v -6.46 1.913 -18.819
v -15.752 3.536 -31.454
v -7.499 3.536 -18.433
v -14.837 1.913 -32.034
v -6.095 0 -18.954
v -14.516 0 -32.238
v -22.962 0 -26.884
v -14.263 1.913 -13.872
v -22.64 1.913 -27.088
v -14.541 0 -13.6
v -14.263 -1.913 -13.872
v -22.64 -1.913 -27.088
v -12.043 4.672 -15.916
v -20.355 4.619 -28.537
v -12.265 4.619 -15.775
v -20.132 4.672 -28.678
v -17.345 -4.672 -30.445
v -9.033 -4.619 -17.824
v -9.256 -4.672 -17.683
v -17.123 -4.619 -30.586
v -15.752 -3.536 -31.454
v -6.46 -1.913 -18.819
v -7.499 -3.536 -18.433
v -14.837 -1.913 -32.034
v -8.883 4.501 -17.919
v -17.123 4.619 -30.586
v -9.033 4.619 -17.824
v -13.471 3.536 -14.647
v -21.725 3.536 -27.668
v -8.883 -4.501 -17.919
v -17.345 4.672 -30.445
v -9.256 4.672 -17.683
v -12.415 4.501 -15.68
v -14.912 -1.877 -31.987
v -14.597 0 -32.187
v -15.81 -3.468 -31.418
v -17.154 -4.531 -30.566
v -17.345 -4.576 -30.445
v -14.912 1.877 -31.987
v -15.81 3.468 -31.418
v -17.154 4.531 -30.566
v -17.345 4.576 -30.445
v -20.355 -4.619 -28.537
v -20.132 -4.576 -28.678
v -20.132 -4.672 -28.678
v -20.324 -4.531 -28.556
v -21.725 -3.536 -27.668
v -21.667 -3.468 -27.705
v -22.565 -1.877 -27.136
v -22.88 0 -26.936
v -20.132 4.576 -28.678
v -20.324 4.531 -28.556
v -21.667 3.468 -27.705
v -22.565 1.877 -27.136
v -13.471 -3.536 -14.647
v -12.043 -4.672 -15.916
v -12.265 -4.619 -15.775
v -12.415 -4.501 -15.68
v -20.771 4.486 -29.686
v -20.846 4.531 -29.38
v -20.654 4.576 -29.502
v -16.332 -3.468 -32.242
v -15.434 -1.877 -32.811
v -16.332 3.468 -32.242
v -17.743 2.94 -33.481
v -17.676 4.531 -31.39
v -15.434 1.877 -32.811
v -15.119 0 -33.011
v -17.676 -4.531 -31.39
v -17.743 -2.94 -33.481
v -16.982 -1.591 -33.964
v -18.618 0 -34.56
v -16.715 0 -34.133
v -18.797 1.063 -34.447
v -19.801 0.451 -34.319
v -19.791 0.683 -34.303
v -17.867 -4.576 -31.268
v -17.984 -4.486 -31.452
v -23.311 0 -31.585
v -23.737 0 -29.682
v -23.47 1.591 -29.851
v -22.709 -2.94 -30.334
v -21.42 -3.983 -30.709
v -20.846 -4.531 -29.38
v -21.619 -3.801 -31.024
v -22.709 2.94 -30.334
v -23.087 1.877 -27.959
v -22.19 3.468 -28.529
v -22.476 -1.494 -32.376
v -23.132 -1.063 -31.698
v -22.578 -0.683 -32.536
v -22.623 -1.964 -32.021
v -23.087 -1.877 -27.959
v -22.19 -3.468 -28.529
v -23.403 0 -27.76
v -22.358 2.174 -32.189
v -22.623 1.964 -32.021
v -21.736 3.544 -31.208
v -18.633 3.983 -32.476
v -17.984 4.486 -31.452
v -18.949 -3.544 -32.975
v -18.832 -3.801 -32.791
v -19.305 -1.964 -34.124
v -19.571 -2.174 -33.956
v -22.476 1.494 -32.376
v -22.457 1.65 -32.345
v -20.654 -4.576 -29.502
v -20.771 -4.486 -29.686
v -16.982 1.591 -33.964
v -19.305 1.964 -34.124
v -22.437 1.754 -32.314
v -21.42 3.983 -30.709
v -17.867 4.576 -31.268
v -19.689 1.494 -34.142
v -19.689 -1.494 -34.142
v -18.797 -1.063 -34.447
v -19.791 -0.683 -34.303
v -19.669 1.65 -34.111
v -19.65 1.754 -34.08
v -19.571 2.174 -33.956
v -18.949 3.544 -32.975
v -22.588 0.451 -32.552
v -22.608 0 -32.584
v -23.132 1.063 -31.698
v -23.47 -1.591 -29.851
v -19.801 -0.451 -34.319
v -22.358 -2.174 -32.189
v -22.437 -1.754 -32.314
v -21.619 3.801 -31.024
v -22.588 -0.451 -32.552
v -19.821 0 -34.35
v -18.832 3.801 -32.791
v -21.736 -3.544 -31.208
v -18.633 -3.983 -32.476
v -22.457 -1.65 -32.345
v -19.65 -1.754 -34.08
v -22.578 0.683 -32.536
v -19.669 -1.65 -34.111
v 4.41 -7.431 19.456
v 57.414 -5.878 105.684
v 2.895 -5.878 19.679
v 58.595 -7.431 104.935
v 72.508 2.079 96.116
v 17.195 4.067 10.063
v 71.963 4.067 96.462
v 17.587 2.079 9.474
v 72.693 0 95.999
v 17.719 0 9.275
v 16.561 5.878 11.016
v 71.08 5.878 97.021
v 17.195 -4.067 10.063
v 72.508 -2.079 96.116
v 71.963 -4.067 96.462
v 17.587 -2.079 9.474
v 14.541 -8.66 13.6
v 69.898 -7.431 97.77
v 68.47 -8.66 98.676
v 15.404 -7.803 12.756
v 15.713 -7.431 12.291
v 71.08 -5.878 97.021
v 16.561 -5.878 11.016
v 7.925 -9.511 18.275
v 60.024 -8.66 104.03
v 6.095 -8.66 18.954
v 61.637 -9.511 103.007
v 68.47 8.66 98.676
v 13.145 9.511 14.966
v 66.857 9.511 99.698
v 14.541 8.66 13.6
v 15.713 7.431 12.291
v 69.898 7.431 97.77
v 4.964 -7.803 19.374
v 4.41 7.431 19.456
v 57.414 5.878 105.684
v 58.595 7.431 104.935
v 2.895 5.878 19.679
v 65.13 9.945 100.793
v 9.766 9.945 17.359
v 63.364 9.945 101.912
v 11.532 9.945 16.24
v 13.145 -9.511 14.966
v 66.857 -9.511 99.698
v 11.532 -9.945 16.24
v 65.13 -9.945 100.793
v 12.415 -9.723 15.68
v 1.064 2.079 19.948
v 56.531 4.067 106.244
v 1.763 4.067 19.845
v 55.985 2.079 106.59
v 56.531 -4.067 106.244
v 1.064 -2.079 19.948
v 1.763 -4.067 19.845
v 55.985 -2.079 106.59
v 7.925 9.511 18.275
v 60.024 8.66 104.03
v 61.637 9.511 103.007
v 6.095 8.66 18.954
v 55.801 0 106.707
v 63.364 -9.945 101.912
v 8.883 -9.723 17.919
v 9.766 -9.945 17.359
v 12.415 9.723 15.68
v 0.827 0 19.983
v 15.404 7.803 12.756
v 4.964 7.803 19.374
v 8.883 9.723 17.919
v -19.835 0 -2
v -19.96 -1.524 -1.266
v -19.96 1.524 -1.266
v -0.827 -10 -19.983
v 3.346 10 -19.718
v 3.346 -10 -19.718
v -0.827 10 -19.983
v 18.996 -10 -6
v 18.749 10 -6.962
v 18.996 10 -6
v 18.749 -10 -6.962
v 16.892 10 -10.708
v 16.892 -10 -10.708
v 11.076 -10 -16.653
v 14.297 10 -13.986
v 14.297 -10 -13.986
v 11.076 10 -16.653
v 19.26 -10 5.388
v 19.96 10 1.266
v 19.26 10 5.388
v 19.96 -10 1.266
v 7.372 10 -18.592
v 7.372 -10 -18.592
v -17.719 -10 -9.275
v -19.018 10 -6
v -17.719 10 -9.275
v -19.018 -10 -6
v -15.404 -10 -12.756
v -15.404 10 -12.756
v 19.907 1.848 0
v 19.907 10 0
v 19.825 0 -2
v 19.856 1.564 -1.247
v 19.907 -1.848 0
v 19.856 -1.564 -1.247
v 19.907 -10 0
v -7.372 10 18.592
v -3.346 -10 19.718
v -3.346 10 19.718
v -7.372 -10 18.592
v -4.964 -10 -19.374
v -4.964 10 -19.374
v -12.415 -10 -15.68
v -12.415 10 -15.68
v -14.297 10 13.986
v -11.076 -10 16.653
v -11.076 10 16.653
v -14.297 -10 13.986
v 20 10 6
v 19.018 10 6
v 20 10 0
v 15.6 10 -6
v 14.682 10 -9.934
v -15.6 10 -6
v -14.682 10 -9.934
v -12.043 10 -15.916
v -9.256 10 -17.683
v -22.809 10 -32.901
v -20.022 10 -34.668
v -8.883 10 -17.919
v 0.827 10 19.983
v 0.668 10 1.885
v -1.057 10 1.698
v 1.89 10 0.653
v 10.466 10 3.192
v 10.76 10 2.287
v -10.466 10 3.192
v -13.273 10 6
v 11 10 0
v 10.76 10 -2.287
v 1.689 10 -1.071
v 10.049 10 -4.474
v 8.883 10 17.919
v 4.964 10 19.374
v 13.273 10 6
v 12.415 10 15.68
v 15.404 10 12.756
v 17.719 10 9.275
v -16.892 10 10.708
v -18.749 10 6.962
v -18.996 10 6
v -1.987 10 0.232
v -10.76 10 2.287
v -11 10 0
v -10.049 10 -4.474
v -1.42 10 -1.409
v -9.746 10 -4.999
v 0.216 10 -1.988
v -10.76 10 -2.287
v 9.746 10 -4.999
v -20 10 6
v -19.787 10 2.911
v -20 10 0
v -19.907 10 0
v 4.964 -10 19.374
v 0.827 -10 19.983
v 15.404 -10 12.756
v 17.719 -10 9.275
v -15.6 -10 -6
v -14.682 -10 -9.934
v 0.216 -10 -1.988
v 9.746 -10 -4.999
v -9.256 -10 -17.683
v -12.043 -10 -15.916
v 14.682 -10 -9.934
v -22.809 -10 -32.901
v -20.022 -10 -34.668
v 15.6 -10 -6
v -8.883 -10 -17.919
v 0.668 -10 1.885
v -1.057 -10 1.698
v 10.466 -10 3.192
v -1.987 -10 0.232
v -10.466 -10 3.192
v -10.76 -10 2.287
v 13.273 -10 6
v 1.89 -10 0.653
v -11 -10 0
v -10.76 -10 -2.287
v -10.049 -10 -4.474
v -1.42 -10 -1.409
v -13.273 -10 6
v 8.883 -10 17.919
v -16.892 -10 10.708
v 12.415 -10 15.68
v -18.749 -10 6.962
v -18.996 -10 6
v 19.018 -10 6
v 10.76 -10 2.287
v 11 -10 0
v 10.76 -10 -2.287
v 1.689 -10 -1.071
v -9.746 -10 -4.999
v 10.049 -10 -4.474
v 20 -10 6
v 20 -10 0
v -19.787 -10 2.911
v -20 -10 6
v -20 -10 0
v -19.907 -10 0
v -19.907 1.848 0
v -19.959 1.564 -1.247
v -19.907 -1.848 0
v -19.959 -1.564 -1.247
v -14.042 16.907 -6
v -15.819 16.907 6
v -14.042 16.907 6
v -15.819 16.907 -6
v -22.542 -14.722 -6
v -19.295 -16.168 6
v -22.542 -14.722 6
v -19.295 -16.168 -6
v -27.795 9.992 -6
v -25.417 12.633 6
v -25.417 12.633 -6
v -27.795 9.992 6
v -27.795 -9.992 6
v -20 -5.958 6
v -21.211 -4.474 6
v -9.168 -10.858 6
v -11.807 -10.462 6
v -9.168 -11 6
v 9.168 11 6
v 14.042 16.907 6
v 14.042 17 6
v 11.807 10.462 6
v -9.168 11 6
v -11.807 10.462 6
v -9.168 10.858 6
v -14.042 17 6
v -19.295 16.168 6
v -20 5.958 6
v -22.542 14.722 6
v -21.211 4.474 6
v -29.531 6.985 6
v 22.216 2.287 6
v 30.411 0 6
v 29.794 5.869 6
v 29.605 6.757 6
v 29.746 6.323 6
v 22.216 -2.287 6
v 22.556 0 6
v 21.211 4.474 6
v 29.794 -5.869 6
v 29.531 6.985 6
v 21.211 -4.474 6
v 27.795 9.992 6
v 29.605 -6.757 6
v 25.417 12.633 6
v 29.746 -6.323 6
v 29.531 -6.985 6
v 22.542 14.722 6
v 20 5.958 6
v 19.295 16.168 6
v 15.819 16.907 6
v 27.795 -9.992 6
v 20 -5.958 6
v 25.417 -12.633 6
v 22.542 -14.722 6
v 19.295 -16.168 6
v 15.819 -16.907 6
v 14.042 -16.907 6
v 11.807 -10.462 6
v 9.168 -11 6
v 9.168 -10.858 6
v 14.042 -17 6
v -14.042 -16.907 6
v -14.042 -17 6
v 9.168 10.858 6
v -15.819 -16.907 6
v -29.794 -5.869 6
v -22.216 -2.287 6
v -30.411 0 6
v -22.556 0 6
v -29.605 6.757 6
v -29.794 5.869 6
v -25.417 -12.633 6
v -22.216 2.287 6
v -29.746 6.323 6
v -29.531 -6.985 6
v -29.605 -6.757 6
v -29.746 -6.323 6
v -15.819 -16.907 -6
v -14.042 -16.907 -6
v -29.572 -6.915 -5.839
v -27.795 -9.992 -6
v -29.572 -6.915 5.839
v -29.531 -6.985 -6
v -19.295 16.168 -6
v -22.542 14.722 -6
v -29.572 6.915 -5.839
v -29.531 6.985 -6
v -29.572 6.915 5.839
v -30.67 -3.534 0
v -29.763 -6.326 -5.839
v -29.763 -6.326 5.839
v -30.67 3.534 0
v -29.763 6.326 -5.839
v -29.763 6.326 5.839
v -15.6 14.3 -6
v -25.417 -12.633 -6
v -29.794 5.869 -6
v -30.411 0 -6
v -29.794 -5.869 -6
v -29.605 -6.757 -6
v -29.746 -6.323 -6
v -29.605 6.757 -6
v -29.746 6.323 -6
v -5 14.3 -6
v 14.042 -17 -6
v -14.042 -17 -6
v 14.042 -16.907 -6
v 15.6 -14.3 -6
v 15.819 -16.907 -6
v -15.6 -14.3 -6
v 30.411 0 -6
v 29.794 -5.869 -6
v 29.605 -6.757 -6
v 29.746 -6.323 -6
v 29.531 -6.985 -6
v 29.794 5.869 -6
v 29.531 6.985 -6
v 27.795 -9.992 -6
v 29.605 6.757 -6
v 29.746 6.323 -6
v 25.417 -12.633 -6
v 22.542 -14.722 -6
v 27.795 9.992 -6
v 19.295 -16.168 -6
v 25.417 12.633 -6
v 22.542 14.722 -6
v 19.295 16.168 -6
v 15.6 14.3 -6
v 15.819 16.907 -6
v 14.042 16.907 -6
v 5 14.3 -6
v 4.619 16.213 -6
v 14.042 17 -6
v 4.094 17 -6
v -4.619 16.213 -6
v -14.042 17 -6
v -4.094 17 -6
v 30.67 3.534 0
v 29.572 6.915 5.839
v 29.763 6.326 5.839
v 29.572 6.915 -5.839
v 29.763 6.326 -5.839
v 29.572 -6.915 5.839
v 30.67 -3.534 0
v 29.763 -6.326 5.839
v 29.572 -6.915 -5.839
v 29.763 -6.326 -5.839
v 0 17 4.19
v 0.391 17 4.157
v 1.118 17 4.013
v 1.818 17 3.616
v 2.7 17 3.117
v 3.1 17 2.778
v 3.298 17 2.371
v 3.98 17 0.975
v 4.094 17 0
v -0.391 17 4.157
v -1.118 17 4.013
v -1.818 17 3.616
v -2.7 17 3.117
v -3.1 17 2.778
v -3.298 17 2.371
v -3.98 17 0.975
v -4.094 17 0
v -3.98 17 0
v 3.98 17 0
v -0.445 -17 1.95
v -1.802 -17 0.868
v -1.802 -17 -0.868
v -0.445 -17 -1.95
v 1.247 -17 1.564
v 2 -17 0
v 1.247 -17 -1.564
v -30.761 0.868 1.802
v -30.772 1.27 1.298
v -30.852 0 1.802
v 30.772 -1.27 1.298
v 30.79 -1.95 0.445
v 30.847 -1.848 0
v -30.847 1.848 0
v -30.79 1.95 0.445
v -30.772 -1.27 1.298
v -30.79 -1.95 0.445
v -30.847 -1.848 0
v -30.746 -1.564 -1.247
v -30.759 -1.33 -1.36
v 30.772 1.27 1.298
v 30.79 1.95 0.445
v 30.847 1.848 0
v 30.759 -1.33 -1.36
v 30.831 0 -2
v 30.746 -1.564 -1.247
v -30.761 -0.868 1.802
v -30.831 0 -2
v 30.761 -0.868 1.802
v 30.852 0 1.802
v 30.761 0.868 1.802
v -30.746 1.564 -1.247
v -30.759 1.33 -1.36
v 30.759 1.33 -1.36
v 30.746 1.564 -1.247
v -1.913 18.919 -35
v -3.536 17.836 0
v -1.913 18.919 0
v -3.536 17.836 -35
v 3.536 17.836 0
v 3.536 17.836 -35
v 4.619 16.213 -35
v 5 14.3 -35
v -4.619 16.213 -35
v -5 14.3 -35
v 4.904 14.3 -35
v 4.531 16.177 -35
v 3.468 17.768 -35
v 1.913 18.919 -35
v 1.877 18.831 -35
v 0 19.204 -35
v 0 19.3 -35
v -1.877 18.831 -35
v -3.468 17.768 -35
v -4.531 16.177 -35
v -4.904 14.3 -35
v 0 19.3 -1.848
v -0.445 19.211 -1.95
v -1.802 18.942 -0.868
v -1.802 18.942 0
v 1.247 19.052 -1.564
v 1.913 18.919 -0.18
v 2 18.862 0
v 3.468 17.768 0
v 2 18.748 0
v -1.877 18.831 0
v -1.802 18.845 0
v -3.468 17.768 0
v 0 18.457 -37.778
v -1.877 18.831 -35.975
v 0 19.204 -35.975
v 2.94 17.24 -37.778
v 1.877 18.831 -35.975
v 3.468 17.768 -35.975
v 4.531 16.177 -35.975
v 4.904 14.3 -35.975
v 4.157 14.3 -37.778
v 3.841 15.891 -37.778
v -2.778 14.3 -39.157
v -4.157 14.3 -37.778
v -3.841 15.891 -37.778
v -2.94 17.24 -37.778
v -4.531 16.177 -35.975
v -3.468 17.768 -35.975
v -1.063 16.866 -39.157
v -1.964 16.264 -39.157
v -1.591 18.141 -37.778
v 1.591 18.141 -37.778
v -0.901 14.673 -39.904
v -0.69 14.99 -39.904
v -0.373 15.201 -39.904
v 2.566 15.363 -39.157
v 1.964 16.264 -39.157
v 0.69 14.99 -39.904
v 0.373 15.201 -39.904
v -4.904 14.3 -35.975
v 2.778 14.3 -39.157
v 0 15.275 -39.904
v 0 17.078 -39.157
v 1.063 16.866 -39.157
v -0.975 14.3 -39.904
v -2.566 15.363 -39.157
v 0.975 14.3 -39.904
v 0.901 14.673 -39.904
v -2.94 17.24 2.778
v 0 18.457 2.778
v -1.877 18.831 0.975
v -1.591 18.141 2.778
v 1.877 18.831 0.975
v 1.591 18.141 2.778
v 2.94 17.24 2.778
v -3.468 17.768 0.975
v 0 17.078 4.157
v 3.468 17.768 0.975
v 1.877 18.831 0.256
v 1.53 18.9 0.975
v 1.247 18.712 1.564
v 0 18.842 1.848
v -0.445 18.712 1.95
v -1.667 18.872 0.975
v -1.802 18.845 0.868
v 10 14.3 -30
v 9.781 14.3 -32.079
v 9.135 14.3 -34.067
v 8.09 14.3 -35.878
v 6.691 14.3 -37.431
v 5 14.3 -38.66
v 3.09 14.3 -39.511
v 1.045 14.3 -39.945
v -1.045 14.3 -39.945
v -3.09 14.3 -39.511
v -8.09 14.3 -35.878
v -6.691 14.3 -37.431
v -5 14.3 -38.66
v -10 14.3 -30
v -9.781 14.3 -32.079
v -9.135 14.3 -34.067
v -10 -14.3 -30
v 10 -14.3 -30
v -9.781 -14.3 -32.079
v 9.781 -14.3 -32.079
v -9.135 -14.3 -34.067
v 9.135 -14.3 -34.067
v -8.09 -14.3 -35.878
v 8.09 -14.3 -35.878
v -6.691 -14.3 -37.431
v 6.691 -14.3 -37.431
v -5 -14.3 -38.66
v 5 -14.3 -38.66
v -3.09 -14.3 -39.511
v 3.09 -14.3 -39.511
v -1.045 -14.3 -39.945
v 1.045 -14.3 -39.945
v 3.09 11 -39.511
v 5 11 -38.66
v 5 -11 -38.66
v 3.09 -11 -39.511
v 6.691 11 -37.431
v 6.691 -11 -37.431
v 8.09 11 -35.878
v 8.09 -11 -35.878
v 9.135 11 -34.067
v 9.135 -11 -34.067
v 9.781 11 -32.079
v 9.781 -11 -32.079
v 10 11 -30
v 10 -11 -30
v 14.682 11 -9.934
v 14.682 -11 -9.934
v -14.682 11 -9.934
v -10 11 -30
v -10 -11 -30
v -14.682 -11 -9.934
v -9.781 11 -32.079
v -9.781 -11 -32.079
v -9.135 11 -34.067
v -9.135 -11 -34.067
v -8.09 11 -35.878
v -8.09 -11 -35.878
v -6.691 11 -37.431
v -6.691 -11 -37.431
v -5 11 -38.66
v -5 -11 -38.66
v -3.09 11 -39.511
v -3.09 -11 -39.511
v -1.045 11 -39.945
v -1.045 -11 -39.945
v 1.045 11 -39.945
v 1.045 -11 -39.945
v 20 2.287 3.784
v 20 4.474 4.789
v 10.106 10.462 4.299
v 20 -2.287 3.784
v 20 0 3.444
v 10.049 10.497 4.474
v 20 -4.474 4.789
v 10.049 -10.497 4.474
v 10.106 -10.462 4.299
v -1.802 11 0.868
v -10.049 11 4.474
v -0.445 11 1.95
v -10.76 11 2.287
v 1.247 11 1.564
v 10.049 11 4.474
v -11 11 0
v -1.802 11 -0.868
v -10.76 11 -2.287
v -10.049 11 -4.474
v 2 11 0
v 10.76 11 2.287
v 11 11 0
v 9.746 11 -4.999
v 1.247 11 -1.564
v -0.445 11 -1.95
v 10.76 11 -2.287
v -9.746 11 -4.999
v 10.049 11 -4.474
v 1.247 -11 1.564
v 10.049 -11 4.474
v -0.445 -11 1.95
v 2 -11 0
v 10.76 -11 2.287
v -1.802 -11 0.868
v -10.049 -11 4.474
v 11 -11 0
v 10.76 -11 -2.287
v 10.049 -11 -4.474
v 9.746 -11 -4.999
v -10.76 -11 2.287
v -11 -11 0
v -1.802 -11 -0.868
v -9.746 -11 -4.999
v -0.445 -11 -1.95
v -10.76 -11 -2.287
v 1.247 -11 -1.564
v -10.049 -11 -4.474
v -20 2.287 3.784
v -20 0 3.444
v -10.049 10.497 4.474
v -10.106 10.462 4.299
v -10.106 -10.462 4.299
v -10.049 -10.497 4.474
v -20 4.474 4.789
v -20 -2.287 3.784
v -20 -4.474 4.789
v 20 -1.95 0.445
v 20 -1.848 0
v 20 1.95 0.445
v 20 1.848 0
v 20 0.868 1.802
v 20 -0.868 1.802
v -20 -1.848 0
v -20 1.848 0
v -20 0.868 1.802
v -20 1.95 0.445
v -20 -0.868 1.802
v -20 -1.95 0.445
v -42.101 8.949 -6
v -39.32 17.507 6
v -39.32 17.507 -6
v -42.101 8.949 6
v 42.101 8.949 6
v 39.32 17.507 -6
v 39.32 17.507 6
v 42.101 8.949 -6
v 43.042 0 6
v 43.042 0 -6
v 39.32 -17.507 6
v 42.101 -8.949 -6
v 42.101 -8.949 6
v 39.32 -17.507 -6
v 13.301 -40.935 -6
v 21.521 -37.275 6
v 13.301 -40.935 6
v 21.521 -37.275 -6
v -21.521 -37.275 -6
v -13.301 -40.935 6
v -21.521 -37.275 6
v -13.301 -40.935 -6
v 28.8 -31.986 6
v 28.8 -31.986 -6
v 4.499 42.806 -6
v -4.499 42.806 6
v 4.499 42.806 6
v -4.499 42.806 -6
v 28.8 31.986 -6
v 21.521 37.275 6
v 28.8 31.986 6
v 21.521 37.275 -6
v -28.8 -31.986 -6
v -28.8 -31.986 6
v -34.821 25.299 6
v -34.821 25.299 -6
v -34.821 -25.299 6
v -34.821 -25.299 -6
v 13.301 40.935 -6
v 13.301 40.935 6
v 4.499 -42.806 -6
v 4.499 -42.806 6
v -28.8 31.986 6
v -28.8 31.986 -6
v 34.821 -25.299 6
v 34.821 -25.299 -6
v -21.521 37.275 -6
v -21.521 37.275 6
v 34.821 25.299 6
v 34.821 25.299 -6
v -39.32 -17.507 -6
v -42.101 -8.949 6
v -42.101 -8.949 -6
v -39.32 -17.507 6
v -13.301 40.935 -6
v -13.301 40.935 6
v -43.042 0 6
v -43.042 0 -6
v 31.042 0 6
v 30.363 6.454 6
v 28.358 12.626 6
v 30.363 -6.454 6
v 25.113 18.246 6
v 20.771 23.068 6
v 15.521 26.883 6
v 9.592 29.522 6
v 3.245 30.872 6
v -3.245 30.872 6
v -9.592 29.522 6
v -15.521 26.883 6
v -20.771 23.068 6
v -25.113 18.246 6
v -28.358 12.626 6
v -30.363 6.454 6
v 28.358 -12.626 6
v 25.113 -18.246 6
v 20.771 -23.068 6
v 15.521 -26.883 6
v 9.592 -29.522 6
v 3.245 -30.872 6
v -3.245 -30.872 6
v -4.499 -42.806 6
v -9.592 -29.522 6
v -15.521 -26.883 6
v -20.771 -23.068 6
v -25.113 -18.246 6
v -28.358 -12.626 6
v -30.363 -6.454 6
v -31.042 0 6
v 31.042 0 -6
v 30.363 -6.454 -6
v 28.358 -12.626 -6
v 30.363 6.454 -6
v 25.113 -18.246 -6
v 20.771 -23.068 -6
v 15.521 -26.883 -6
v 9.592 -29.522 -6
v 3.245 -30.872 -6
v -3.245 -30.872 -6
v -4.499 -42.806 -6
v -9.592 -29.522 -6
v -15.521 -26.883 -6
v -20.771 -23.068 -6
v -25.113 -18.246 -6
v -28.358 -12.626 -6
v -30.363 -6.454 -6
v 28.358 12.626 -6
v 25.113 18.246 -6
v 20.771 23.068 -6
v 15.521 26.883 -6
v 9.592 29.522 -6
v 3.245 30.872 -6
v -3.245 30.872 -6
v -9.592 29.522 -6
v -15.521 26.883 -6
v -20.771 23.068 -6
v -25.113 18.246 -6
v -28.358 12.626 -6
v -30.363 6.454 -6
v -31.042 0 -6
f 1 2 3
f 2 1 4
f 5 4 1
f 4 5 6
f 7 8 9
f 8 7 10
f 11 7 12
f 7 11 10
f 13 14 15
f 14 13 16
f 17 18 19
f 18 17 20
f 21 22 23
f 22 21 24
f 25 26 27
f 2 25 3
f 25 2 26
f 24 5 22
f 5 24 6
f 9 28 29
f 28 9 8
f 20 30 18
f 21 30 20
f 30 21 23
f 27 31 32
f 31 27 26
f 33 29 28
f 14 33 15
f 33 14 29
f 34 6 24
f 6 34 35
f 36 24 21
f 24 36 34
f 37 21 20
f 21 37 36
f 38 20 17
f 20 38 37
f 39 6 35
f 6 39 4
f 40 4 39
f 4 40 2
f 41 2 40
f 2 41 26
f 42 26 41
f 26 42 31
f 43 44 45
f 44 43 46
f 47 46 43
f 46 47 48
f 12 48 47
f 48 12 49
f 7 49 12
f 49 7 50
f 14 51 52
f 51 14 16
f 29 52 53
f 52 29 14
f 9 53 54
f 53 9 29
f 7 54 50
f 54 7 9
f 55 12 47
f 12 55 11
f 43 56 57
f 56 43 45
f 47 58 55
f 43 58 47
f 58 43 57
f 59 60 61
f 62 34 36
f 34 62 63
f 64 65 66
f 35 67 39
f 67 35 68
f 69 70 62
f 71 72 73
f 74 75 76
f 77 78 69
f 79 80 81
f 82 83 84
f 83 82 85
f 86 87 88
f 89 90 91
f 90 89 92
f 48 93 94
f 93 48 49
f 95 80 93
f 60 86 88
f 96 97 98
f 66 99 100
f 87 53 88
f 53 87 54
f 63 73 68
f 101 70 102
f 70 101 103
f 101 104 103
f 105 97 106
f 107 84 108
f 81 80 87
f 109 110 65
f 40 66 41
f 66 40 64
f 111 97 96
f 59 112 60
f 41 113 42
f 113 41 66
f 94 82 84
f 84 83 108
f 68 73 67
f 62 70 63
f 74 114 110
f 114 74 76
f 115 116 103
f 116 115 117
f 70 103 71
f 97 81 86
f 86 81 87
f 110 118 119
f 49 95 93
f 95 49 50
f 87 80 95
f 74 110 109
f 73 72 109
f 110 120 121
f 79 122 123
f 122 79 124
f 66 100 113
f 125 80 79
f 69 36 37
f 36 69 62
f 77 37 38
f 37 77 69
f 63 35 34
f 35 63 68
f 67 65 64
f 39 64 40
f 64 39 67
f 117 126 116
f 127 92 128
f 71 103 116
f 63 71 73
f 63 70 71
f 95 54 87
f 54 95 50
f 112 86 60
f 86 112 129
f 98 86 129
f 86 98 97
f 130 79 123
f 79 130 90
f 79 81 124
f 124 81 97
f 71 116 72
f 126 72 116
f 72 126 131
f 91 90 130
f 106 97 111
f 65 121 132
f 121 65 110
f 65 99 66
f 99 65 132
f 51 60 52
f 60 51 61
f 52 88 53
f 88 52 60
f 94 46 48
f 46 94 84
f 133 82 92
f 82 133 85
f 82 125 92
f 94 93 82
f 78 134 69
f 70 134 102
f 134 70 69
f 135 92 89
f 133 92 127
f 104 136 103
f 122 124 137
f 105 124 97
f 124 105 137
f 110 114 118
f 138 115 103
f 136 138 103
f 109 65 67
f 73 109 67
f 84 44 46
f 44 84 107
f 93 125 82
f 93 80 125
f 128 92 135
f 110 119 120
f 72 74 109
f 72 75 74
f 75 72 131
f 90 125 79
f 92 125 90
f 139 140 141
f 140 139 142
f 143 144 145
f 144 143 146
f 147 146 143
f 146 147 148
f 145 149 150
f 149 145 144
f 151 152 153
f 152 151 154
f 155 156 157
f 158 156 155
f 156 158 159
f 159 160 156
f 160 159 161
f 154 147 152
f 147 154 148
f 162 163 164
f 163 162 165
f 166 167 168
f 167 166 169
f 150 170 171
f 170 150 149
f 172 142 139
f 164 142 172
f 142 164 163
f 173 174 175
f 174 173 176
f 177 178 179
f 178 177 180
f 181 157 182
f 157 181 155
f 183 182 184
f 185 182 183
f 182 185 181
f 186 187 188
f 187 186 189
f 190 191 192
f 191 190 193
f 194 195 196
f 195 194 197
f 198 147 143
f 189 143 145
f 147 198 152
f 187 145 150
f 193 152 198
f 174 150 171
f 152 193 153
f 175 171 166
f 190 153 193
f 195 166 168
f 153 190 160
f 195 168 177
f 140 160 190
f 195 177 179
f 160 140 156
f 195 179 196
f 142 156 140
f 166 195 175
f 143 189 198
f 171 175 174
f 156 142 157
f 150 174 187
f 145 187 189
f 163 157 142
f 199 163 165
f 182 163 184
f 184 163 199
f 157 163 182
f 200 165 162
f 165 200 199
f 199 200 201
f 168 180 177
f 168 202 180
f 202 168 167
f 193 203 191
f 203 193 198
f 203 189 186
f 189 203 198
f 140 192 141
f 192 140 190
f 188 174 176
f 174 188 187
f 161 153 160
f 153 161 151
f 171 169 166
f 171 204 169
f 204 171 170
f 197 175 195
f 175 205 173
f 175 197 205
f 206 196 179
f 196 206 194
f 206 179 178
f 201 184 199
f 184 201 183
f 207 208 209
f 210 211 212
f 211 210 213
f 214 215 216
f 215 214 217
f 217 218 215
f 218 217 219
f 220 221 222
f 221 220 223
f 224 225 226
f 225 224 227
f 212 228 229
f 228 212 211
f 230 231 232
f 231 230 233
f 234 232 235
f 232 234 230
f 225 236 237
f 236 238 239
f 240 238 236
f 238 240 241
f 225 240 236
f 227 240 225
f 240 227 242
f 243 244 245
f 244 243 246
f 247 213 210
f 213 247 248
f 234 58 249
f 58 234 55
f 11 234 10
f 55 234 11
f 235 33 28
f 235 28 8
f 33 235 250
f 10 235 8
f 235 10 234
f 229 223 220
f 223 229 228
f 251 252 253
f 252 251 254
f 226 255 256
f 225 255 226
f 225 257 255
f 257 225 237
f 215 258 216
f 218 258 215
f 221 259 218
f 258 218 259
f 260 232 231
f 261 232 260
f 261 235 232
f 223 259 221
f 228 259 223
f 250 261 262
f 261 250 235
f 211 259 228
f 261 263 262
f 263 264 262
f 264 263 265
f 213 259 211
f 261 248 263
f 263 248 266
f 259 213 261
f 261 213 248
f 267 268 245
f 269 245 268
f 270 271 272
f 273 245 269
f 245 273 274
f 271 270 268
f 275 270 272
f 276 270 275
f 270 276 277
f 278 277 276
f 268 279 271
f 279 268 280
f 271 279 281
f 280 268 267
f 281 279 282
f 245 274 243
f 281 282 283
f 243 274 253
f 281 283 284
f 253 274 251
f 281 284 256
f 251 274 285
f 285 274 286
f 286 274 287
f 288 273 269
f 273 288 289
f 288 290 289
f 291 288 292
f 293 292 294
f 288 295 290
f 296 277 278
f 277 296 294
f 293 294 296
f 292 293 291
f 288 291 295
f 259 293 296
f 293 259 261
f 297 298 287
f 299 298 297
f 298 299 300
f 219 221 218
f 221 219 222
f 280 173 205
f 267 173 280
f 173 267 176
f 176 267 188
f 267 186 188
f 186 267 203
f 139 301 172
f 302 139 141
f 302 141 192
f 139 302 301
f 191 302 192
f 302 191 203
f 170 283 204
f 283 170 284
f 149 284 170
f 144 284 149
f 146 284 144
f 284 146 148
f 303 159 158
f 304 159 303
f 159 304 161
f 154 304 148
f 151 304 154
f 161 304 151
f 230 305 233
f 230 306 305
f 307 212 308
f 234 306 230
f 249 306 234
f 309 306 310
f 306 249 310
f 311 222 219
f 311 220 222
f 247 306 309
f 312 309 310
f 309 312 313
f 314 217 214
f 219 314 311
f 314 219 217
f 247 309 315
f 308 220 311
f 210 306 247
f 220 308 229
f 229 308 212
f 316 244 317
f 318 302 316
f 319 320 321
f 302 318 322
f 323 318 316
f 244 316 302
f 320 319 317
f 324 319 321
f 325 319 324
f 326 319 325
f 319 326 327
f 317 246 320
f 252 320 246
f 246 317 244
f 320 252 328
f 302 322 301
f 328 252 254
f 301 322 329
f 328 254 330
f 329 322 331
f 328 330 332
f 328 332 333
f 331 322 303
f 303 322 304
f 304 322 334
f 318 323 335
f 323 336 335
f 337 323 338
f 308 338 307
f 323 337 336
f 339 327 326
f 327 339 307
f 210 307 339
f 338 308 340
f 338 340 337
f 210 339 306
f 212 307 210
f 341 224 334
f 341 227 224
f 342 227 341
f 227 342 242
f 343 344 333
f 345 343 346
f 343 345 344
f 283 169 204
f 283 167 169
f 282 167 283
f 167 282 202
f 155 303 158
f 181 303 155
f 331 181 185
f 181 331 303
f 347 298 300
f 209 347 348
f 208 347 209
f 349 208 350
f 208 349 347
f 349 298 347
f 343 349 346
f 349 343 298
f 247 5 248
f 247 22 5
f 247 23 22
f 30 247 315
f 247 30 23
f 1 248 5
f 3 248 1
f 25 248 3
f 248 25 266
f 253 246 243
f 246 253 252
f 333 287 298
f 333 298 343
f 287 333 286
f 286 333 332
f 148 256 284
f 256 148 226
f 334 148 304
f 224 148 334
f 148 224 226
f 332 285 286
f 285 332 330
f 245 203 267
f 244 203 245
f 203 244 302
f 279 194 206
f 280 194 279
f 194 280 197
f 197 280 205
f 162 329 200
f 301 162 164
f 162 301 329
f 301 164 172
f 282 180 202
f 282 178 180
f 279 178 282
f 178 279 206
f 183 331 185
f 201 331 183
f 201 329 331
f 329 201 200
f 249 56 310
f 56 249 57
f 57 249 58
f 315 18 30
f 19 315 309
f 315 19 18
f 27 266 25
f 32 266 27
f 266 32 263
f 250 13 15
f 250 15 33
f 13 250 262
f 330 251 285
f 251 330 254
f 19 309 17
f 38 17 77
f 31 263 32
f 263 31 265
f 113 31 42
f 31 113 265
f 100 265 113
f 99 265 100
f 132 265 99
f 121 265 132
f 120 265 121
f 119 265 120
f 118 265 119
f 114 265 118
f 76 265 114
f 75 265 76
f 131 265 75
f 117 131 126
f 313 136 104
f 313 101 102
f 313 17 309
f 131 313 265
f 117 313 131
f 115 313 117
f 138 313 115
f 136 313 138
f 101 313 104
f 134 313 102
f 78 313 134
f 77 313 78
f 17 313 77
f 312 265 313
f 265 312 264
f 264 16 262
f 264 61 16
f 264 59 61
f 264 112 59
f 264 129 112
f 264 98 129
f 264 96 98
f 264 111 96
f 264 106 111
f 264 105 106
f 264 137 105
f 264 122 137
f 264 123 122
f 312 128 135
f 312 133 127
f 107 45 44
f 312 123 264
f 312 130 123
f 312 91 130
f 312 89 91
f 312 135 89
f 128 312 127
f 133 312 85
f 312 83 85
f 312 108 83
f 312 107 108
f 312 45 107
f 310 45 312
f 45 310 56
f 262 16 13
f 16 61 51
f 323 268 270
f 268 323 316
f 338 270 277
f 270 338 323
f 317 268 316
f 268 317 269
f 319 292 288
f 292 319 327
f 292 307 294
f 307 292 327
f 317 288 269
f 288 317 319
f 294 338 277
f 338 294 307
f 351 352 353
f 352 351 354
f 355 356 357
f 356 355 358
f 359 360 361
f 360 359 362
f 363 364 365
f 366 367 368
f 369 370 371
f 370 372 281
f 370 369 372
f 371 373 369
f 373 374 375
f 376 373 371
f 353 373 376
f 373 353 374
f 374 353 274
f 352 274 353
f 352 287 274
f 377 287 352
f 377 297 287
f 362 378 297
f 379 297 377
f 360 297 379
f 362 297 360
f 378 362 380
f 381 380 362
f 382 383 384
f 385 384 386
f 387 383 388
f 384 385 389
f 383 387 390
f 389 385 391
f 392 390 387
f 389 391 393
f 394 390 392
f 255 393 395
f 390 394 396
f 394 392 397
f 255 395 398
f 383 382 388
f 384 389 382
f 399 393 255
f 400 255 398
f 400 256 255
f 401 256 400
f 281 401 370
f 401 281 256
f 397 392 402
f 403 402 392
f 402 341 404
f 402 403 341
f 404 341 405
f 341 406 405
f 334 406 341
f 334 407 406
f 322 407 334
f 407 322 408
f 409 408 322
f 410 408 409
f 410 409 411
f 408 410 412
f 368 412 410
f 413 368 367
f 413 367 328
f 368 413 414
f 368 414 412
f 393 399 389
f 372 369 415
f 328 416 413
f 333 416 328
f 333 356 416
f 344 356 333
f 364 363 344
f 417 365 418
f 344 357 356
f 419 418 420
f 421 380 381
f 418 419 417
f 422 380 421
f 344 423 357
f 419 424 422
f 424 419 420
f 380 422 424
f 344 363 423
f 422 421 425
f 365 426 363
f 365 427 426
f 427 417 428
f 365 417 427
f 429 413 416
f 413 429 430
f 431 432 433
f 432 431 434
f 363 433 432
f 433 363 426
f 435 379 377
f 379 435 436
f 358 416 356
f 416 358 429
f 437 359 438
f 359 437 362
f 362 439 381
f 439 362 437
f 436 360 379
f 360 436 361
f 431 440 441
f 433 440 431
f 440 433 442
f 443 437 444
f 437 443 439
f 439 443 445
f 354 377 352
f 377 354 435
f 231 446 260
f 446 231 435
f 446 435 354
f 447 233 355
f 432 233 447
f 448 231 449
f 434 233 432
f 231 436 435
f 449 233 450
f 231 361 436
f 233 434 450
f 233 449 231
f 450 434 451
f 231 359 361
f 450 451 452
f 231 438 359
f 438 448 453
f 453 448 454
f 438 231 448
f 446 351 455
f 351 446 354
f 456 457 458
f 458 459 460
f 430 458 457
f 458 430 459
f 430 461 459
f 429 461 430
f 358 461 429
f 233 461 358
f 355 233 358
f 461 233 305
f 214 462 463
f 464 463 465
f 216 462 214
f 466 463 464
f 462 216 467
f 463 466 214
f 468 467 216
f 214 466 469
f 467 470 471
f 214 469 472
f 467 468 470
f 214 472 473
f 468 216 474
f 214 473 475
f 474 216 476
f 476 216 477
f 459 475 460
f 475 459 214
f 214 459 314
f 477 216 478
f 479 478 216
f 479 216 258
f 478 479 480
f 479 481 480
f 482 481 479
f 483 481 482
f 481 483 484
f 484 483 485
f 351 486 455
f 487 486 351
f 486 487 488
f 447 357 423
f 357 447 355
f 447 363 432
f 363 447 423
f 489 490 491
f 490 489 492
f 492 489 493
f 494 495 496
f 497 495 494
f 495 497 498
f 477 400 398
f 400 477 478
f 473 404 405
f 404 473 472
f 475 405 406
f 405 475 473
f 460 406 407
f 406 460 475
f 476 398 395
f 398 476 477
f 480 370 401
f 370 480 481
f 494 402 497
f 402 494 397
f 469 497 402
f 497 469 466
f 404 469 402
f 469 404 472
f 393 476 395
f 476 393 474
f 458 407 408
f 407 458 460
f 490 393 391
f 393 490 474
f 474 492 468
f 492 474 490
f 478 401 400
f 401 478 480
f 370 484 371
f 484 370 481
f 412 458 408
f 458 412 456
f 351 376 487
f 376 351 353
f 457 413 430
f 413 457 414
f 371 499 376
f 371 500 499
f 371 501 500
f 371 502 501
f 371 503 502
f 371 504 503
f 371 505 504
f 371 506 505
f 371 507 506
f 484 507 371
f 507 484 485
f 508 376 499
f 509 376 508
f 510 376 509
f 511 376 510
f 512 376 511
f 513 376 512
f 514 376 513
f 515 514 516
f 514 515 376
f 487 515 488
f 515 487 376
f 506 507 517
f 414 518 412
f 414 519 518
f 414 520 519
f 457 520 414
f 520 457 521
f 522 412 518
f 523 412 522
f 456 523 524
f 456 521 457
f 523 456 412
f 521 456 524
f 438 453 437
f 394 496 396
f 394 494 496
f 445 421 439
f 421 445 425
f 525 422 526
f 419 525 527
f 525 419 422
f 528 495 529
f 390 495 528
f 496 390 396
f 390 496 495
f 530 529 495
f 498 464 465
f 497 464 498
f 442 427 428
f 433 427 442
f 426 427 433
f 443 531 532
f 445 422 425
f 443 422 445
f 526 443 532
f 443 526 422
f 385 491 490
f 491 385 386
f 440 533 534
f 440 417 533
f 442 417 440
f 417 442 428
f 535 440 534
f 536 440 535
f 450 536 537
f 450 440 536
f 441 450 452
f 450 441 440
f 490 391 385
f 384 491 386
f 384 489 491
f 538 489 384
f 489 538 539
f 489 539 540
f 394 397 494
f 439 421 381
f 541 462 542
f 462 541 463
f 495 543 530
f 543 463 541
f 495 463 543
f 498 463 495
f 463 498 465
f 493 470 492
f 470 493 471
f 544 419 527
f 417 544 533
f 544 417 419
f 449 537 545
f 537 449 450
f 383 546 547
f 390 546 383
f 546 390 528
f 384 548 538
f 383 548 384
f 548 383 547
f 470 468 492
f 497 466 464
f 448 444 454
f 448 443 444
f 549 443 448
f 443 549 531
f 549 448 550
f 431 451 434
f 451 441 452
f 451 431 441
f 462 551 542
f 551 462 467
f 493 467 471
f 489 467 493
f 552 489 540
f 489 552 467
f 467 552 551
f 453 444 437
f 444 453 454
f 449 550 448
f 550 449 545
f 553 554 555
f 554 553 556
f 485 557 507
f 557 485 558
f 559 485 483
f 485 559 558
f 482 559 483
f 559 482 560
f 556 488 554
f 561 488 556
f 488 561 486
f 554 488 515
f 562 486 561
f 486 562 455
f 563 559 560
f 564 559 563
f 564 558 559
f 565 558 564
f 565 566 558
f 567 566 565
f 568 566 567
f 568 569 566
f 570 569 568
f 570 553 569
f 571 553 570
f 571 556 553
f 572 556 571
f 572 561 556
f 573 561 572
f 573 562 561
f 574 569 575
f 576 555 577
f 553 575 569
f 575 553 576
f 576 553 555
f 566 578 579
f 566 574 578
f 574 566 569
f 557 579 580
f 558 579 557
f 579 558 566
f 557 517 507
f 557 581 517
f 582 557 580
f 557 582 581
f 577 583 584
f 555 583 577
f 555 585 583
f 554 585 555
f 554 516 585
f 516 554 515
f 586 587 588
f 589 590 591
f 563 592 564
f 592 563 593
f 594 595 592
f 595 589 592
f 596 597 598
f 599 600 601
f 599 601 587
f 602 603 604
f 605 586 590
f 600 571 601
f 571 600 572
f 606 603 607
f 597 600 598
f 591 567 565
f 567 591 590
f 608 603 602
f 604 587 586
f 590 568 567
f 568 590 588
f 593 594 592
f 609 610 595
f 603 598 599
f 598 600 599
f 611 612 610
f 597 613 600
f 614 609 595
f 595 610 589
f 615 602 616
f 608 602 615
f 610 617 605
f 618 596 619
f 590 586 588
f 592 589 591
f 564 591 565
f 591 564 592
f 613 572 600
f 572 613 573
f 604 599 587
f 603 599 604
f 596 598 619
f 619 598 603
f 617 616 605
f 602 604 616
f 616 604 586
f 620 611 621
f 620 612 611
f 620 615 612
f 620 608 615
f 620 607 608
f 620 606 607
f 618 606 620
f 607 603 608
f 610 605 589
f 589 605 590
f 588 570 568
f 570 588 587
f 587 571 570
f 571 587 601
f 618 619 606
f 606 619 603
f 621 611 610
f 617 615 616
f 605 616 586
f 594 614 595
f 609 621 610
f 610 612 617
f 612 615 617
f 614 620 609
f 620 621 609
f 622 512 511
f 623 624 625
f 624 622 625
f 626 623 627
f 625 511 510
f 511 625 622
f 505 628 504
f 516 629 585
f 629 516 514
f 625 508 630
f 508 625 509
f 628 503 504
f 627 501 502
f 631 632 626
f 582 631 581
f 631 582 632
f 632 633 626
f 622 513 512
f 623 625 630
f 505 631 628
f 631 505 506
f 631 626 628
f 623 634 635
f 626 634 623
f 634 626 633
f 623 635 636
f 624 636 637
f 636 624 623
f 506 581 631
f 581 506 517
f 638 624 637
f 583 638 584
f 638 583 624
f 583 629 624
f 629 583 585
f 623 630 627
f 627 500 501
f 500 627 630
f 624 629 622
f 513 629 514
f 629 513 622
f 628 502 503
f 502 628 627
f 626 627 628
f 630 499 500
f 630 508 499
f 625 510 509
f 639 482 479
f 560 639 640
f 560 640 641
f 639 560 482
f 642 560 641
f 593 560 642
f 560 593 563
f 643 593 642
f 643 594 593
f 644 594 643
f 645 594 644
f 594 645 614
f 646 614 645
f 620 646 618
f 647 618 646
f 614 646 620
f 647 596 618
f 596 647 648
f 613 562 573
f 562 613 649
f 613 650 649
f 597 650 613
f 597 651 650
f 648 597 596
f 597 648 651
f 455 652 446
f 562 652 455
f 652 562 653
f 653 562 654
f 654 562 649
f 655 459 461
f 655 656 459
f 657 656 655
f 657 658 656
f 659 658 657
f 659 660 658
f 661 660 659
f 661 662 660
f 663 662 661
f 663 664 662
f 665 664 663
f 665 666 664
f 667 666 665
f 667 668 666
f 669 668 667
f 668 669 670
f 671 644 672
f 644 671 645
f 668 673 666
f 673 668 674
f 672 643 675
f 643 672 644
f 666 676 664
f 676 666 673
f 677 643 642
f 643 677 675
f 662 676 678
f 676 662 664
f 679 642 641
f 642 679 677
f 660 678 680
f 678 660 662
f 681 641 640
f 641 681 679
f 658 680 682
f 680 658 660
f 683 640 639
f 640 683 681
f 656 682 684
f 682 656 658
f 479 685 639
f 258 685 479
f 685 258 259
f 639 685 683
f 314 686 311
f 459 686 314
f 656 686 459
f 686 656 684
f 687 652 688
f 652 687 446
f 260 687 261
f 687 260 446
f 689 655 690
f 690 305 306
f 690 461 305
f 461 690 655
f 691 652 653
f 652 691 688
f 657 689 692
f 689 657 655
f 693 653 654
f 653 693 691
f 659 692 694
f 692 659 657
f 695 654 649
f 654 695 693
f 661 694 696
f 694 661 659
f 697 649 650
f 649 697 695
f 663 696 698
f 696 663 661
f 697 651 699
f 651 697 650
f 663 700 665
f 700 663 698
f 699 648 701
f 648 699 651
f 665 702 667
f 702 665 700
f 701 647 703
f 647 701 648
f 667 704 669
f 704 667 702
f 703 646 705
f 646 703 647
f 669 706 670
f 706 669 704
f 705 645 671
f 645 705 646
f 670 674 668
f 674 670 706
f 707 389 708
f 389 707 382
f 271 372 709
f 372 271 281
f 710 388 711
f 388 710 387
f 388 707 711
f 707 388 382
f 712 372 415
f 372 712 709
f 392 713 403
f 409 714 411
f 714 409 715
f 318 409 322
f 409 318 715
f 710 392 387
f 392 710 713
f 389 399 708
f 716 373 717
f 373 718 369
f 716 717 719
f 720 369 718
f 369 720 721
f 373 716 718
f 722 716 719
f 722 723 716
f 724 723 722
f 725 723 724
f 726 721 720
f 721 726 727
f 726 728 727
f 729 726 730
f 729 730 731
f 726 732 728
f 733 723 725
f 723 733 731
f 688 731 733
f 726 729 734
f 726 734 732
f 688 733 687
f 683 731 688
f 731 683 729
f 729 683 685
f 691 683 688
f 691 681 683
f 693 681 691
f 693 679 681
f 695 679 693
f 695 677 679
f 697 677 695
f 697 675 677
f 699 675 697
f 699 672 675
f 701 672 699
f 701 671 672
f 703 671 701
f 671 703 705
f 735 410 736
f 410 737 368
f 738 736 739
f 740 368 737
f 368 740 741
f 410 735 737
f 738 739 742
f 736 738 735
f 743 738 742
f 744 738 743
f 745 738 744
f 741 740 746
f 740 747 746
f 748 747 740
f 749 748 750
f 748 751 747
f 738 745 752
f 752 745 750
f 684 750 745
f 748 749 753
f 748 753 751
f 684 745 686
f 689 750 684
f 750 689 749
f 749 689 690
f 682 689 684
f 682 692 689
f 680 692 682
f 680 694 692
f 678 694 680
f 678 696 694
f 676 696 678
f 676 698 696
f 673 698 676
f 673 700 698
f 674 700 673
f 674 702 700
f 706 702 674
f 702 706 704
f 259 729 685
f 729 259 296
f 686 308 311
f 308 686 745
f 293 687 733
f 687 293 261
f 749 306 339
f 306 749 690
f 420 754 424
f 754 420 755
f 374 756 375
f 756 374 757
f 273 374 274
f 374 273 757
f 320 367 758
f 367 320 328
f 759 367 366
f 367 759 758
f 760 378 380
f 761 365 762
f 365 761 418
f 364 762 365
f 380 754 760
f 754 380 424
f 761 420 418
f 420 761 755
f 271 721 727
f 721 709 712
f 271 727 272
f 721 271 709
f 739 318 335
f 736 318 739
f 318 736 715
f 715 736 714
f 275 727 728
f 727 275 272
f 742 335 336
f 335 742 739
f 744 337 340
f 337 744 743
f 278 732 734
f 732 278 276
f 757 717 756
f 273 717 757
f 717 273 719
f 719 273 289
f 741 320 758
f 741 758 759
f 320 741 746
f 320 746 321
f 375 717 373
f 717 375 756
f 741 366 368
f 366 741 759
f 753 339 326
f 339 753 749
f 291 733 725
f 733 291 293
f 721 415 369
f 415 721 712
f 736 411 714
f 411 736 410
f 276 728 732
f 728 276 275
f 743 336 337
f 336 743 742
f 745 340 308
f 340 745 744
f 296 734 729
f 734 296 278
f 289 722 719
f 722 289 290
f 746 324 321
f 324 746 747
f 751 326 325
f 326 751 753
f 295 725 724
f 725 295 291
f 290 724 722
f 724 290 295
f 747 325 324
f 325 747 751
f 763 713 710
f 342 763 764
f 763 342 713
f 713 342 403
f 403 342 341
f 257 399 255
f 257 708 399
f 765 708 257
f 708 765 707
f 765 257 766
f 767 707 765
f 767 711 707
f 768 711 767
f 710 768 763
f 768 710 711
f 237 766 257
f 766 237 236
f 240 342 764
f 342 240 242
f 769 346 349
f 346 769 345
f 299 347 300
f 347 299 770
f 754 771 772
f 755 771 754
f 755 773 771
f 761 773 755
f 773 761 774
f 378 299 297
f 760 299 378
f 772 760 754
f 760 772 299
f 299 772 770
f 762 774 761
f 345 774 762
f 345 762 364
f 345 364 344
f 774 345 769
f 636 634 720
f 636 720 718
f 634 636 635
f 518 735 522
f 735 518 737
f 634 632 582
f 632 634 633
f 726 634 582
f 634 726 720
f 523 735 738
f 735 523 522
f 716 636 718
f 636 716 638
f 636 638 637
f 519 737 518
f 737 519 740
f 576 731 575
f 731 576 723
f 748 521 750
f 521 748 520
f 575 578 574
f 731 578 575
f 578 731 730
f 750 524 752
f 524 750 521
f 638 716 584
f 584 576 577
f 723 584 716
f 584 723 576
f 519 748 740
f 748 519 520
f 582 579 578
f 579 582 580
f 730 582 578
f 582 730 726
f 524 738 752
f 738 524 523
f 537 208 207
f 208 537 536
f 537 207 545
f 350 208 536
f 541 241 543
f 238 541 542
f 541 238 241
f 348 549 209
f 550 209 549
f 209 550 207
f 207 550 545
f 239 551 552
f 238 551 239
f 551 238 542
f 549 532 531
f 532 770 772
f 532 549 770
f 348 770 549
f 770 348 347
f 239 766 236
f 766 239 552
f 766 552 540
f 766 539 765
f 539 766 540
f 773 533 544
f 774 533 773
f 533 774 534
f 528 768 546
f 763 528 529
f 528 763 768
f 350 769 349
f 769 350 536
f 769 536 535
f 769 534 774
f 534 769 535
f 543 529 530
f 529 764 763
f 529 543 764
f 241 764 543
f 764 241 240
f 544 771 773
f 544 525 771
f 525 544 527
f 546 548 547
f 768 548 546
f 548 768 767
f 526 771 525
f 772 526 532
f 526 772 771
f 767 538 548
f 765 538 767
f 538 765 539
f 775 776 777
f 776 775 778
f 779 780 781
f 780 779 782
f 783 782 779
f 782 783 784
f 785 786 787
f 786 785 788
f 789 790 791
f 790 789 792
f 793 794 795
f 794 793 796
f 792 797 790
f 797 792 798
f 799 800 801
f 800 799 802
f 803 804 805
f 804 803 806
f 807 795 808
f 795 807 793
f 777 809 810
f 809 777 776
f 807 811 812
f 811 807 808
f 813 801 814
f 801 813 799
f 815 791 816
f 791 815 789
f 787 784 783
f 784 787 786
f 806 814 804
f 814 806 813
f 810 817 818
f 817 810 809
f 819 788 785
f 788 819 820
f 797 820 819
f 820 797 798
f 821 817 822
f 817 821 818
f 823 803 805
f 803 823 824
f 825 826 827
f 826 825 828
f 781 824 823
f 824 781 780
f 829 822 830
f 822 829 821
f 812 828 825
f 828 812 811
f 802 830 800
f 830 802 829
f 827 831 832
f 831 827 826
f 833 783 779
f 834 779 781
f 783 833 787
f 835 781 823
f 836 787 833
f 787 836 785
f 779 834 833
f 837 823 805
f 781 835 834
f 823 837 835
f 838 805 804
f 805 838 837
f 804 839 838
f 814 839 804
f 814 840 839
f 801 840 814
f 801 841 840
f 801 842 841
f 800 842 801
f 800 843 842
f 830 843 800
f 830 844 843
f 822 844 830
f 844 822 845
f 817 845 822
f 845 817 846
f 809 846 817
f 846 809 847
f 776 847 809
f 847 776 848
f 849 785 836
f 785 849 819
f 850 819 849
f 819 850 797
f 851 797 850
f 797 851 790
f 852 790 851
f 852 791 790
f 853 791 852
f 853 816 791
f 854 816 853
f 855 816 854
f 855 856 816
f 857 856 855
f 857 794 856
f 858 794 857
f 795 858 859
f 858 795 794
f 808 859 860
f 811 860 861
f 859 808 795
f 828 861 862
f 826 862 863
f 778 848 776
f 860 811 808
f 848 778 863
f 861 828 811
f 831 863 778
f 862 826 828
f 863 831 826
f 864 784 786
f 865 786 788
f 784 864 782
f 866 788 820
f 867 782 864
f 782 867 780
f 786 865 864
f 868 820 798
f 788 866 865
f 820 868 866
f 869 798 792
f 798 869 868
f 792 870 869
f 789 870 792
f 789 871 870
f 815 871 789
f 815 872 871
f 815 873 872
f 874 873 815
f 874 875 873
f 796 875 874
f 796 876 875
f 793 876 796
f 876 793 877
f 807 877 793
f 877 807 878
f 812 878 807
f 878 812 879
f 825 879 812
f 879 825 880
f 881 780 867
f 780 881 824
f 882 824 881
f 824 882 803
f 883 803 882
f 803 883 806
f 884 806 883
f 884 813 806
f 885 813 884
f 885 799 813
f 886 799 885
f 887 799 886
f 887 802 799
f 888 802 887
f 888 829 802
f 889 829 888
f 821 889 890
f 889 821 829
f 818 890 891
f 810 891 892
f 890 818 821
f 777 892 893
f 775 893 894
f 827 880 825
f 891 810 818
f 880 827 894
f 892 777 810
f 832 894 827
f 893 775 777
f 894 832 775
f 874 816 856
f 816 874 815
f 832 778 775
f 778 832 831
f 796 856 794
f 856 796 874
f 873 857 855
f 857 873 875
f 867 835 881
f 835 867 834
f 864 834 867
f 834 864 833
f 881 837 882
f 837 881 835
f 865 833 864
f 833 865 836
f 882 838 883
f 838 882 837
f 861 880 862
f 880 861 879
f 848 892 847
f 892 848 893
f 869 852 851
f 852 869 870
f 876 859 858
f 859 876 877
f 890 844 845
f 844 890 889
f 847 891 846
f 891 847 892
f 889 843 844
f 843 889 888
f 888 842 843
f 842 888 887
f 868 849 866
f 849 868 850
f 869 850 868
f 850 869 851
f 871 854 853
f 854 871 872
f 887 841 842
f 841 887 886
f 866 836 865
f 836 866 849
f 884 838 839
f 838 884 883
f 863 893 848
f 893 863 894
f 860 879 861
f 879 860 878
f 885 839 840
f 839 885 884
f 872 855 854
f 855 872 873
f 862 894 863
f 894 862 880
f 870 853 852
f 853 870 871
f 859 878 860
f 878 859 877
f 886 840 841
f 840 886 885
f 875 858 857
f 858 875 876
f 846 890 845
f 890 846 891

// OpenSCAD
//
//  Copyright (C) 13-02-2012 Jasper den Ouden.
//
//  This is free software: you can redistribute it and/or modify
//  it under the terms of the GNU General Public License as published
//  by the Free Software Foundation, either version 3 of the License, or
//  (at your option) any later verssion.
//

r = 10;
node_r = 2*r;

hinge_r = 2;
hinge_d = 3*hinge_r;

space_d = 1;

phi_limit = 45;

up_l = 120;
down_l = 40;

theta_h = 30;
theta_d = 6;

//theta_w = 2*(theta_h*tan(phi_limit) + space_d + theta_d);
theta_w = 2*max(hinge_d*tan(phi_limit) + 
                (r + theta_d + space_d)/cos(phi_limit) +
                space_d,
              node_r + space_d + hinge_d);
max_l = max(up_l,down_l);

plate_w = 3.3;

bottom_r = 10;

theta_reinforce_d = 5;
phi_reinforce_d = r/2;

module swivel_theta_mount_1(){}
module swivel_theta_mount_2(){ sphere(4); }

module swivel_phi()
{ difference()
    { union()
        { cylinder(h=up_l , r=r);
          rotate(a=90,v=[1,0,0]) translate([0,0,-r])
              cylinder(h=2*r, r=node_r);
          translate([-plate_w/2,-r,-down_l]) cube([plate_w, 2*r,down_l]);
          translate([0,0,phi_reinforce_d-down_l]) union()
          { cylinder(h=down_l,r=phi_reinforce_d);
            sphere(phi_reinforce_d);
          }
        }
      rotate(a=90,v=[1,0,0]) translate([0,0,-2*r]) cylinder(h=4*r, r=hinge_r);
    }
}

module swivel_center_cutter()
{ cylinder(h=up_l+space_d, r= r+space_d);
  translate([-plate_w/2-space_d,-r-space_d,-down_l]) 
      cube([plate_w+2*space_d, 2*(r+space_d),down_l+2*space_d]);
  translate([0,0,-down_l]) cylinder(r=phi_reinforce_d, h=down_l);
}

module swivel_center_cut()
{
  rotate(a=90,v=[1,0,0]) translate([0,0,-r-space_d]) 
      linear_extrude(height = 2*(r+space_d)) union()
  { intersection()
      { polygon([[space_d,0], 
                 [space_d+2*up_l*sin(phi_limit), 2*up_l*cos(phi_limit)],
                 [0,2*up_l],
                 [-space_d-2*up_l*sin(phi_limit), 2*up_l*cos(phi_limit)], 
                 [-space_d,0]]);
        circle(sqrt(pow(up_l,2)+pow(plate_w/2,2))+space_d);
      }
    intersection()
    { polygon([[space_d,0], 
               [space_d+2*down_l*sin(phi_limit), -2*down_l*cos(phi_limit)],
               [0,-2*down_l],
               [-space_d-2*down_l*sin(phi_limit), -2*down_l*cos(phi_limit)], 
               [-space_d,0]]);
      circle(sqrt(pow(down_l,2)+pow(plate_w/2,2))+space_d);
    }
  }
  translate([space_d,0]) rotate(a= phi_limit,v=[0,1,0]) 
      swivel_center_cutter();
  translate([space_d,0]) rotate(a=-phi_limit,v=[0,1,0]) 
        swivel_center_cutter();

  translate([-space_d,0]) rotate(a= phi_limit,v=[0,1,0]) 
      swivel_center_cutter();
  translate([-space_d,0]) rotate(a=-phi_limit,v=[0,1,0]) 
      swivel_center_cutter();
  
  rotate(a=90,v=[1,0,0]) translate([0,0,-r-space_d]) 
      cylinder(h=2*(r+space_d), r= r+space_d);
}

round_r = r+space_d+theta_d;
module swivel_theta_base()
{
    intersection()
    { translate([0,0,-hinge_d]) union()
        {
            translate([-theta_w/2 + round_r,0]) 
                cylinder(r=round_r, h=2*hinge_d); 
            translate([theta_w/2 - round_r,0])
                cylinder(r=round_r, h=2*hinge_d);
            
            translate([-theta_w/2+round_r,-round_r]) 
                cube([theta_w-2*round_r, 2*round_r, 2*hinge_d]);
        }
      sphere(theta_w/2);
    }
}

module theta_tube_reinforcement()
{
    translate([0,r+plate_w+space_d]) union()
    { sphere(theta_reinforce_d);
      translate([0, 0,-down_l+theta_reinforce_d]) union() 
      { cylinder(r= theta_reinforce_d, h= down_l - theta_reinforce_d);
        sphere(theta_reinforce_d);
      }
    }
}

module theta_reinforcement()
{ theta_tube_reinforcement(); }

module swivel_theta()
{ difference()
    { union()
        { swivel_theta_base();
          
//          rotate(a=-90,v=[1,0,0]) 
//              cylinder(r=hinge_d, h= r+plate_w+space_d+theta_reinforce_d);
          theta_reinforcement();
            
          rotate(a=90,v=[1,0,0]) translate([0,0,-r-plate_w-space_d]) 
              linear_extrude(height = 2*(r+plate_w+space_d)) union()
          { polygon([[r+hinge_d+space_d,0], [-r-hinge_d-space_d,0],
                     [-bottom_r, bottom_r-down_l,], 
                     [bottom_r,  bottom_r-down_l]]);
            translate([0,bottom_r-down_l]) circle(bottom_r);
          }
        }
      translate([-node_r, -r]) cube([2*node_r, 2*r, node_r]);
      swivel_center_cut();
      rotate(a=90,v=[1,0,0]) translate([0,0,-2*theta_w]) 
          cylinder(h=4*theta_w, r=hinge_r);
      rotate(a=90,v=[0,1,0]) translate([0,0,-2*theta_w]) 
          cylinder(h=4*theta_w, r=hinge_r);
    }
}

holder_h = 2*hinge_d;
holder_rp = 2*hinge_d;

module swivel_holder()
{ translate([0,0,-holder_h/2]) difference()
    { cylinder(r= theta_w/2+holder_rp, h= holder_h);
      translate([0,0,-hinge_d]) cylinder(r= theta_w/2, 
                                         h= holder_h+2*hinge_d);
    }
}
//swivel_center_cut();
theta = 45*sin(360*$t);
phi = 45*cos(360*$t+44);

rotate(v=[1,0,0], a=theta) rotate(v=[0,1,0], a=phi) color([0,0,1]) 
swivel_phi();
rotate(v=[1,0,0], a=theta) swivel_theta();
swivel_holder();
